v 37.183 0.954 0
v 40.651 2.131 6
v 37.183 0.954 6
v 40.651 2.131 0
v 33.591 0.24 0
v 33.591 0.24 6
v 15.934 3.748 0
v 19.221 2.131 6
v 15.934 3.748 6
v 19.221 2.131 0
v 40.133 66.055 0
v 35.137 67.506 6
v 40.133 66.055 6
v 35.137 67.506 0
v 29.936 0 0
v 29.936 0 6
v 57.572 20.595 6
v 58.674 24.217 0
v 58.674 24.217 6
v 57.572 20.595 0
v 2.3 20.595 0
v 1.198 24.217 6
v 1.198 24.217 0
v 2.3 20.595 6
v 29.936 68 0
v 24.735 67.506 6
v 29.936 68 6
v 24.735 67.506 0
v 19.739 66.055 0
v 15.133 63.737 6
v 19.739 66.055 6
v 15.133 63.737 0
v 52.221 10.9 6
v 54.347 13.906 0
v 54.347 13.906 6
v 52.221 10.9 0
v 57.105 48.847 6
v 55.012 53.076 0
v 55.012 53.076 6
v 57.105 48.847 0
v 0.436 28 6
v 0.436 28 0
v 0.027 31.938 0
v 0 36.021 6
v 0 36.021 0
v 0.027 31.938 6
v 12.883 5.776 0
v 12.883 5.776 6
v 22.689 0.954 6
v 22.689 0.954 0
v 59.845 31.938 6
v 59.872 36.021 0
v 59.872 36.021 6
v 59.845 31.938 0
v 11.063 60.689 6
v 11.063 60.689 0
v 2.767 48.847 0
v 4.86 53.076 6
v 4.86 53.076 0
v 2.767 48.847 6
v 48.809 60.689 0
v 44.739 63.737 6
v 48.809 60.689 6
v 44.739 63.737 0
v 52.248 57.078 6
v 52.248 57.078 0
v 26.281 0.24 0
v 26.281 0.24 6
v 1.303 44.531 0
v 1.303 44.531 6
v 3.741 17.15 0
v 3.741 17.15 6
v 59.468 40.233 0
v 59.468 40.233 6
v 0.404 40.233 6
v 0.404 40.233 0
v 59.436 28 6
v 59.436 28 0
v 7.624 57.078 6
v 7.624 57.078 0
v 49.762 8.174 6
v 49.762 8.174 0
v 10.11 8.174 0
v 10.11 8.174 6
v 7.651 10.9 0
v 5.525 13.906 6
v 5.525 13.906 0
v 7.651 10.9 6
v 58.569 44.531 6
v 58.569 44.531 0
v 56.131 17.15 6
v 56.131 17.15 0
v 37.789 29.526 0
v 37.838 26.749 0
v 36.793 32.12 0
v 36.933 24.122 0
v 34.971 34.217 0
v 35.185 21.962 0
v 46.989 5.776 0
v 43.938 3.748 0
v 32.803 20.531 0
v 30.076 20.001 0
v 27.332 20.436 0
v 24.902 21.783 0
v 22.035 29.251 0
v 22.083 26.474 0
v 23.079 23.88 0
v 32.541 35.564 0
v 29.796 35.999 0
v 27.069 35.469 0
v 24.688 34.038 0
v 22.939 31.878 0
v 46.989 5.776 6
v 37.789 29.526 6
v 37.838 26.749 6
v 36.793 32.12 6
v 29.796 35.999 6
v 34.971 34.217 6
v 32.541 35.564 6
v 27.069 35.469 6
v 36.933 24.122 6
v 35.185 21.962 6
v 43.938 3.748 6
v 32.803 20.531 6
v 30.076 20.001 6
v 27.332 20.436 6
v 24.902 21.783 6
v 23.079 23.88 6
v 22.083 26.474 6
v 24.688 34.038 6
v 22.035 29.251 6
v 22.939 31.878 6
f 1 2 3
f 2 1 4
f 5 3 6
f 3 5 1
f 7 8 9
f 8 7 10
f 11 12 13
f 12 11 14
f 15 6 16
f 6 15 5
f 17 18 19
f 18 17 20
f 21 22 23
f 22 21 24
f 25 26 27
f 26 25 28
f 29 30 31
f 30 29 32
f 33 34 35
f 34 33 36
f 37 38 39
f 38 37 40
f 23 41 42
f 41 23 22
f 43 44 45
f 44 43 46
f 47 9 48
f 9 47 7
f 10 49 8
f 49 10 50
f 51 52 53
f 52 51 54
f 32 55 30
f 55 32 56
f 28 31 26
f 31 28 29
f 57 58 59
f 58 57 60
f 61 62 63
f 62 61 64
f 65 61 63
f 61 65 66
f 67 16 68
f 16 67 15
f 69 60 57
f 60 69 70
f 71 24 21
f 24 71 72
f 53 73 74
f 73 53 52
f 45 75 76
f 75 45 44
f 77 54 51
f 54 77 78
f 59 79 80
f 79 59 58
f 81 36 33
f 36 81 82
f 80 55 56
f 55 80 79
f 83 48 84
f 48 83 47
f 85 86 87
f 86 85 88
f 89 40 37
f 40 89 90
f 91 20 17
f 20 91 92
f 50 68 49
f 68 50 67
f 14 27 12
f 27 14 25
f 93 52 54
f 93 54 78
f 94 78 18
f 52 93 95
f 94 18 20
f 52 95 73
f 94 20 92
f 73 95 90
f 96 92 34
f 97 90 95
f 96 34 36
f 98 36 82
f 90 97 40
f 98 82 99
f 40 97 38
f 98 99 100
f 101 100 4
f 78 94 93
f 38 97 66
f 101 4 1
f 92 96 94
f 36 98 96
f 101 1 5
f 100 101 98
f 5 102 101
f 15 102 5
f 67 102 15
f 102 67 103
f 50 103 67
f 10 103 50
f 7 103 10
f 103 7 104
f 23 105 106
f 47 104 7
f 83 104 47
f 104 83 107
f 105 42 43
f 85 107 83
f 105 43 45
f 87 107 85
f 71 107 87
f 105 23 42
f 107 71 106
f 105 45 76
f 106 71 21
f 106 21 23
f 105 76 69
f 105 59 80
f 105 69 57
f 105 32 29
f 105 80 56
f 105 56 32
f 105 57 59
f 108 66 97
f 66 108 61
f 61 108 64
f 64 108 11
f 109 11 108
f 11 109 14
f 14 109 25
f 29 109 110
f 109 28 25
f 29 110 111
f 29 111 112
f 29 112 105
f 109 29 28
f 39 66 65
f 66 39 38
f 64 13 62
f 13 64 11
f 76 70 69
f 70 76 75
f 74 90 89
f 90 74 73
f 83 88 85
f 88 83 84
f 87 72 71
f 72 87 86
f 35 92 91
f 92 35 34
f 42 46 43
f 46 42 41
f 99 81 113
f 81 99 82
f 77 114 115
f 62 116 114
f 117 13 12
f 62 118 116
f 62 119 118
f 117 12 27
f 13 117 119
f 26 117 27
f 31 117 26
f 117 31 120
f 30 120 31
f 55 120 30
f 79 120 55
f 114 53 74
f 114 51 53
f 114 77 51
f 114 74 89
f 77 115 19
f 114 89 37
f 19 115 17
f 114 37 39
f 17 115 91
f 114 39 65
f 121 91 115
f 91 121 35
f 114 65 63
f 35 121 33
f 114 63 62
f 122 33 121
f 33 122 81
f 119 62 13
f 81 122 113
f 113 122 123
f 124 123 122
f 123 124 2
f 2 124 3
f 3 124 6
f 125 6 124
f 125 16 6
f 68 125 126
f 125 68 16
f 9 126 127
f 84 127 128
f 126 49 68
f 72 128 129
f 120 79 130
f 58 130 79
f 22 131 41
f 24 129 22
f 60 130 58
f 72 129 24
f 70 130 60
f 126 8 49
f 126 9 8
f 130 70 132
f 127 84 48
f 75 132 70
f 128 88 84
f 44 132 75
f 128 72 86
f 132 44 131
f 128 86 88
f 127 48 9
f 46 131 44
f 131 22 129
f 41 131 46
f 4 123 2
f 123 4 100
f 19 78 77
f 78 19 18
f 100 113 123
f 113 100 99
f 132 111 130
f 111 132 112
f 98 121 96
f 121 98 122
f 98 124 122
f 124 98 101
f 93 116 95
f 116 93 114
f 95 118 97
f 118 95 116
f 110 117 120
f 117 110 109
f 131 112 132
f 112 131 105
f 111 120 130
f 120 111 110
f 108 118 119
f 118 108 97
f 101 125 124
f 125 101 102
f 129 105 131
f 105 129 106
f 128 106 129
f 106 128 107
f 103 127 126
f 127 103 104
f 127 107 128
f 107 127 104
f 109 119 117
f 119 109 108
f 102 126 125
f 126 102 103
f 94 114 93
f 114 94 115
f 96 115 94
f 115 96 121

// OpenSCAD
$fn = 32;

// ----------------------------------------------------------------------
// Cam plate: single_lobe cam, base R28
// ----------------------------------------------------------------------

// --- parameters (mm) ---
base_r = 28;              // base circle radius
lobe_h = 12;              // cam lobe rise
bore_r = 8;               // shaft bore radius
plate_t = 6;              // plate thickness, Z (extrusion height)

profile = [[59.436, 28], [59.845, 31.938], [59.872, 36.021], [59.468, 40.233], [58.569, 44.531], [57.105, 48.847], [55.012, 53.076], [52.248, 57.078], [48.809, 60.689], [44.739, 63.737], [40.133, 66.055], [35.137, 67.506], [29.936, 68], [24.735, 67.506], [19.739, 66.055], [15.133, 63.737], [11.063, 60.689], [7.624, 57.078], [4.86, 53.076], [2.767, 48.847], [1.303, 44.531], [0.404, 40.233], [0, 36.021], [0.027, 31.938], [0.436, 28], [1.198, 24.217], [2.3, 20.595], [3.741, 17.15], [5.525, 13.906], [7.651, 10.9], [10.11, 8.174], [12.883, 5.776], [15.934, 3.748], [19.221, 2.131], [22.689, 0.954], [26.281, 0.24], [29.936, 0], [33.591, 0.24], [37.183, 0.954], [40.651, 2.131], [43.938, 3.748], [46.989, 5.776], [49.762, 8.174], [52.221, 10.9], [54.347, 13.906], [56.131, 17.15], [57.572, 20.595], [58.674, 24.217]];  // primary outline, 48 points, counter clockwise
void_1 = [[37.789, 29.526], [36.793, 32.12], [34.971, 34.217], [32.541, 35.564], [29.796, 35.999], [27.069, 35.469], [24.688, 34.038], [22.939, 31.878], [22.035, 29.251], [22.083, 26.474], [23.079, 23.88], [24.902, 21.783], [27.332, 20.436], [30.076, 20.001], [32.803, 20.531], [35.185, 21.962], [36.933, 24.122], [37.838, 26.749]];  // shaft bore, 18 points

// --- the one profile operation ---
difference() {
  linear_extrude(height = plate_t) polygon(points = profile);
  translate([0, 0, -1])
    linear_extrude(height = plate_t + 2) polygon(points = void_1);
}
